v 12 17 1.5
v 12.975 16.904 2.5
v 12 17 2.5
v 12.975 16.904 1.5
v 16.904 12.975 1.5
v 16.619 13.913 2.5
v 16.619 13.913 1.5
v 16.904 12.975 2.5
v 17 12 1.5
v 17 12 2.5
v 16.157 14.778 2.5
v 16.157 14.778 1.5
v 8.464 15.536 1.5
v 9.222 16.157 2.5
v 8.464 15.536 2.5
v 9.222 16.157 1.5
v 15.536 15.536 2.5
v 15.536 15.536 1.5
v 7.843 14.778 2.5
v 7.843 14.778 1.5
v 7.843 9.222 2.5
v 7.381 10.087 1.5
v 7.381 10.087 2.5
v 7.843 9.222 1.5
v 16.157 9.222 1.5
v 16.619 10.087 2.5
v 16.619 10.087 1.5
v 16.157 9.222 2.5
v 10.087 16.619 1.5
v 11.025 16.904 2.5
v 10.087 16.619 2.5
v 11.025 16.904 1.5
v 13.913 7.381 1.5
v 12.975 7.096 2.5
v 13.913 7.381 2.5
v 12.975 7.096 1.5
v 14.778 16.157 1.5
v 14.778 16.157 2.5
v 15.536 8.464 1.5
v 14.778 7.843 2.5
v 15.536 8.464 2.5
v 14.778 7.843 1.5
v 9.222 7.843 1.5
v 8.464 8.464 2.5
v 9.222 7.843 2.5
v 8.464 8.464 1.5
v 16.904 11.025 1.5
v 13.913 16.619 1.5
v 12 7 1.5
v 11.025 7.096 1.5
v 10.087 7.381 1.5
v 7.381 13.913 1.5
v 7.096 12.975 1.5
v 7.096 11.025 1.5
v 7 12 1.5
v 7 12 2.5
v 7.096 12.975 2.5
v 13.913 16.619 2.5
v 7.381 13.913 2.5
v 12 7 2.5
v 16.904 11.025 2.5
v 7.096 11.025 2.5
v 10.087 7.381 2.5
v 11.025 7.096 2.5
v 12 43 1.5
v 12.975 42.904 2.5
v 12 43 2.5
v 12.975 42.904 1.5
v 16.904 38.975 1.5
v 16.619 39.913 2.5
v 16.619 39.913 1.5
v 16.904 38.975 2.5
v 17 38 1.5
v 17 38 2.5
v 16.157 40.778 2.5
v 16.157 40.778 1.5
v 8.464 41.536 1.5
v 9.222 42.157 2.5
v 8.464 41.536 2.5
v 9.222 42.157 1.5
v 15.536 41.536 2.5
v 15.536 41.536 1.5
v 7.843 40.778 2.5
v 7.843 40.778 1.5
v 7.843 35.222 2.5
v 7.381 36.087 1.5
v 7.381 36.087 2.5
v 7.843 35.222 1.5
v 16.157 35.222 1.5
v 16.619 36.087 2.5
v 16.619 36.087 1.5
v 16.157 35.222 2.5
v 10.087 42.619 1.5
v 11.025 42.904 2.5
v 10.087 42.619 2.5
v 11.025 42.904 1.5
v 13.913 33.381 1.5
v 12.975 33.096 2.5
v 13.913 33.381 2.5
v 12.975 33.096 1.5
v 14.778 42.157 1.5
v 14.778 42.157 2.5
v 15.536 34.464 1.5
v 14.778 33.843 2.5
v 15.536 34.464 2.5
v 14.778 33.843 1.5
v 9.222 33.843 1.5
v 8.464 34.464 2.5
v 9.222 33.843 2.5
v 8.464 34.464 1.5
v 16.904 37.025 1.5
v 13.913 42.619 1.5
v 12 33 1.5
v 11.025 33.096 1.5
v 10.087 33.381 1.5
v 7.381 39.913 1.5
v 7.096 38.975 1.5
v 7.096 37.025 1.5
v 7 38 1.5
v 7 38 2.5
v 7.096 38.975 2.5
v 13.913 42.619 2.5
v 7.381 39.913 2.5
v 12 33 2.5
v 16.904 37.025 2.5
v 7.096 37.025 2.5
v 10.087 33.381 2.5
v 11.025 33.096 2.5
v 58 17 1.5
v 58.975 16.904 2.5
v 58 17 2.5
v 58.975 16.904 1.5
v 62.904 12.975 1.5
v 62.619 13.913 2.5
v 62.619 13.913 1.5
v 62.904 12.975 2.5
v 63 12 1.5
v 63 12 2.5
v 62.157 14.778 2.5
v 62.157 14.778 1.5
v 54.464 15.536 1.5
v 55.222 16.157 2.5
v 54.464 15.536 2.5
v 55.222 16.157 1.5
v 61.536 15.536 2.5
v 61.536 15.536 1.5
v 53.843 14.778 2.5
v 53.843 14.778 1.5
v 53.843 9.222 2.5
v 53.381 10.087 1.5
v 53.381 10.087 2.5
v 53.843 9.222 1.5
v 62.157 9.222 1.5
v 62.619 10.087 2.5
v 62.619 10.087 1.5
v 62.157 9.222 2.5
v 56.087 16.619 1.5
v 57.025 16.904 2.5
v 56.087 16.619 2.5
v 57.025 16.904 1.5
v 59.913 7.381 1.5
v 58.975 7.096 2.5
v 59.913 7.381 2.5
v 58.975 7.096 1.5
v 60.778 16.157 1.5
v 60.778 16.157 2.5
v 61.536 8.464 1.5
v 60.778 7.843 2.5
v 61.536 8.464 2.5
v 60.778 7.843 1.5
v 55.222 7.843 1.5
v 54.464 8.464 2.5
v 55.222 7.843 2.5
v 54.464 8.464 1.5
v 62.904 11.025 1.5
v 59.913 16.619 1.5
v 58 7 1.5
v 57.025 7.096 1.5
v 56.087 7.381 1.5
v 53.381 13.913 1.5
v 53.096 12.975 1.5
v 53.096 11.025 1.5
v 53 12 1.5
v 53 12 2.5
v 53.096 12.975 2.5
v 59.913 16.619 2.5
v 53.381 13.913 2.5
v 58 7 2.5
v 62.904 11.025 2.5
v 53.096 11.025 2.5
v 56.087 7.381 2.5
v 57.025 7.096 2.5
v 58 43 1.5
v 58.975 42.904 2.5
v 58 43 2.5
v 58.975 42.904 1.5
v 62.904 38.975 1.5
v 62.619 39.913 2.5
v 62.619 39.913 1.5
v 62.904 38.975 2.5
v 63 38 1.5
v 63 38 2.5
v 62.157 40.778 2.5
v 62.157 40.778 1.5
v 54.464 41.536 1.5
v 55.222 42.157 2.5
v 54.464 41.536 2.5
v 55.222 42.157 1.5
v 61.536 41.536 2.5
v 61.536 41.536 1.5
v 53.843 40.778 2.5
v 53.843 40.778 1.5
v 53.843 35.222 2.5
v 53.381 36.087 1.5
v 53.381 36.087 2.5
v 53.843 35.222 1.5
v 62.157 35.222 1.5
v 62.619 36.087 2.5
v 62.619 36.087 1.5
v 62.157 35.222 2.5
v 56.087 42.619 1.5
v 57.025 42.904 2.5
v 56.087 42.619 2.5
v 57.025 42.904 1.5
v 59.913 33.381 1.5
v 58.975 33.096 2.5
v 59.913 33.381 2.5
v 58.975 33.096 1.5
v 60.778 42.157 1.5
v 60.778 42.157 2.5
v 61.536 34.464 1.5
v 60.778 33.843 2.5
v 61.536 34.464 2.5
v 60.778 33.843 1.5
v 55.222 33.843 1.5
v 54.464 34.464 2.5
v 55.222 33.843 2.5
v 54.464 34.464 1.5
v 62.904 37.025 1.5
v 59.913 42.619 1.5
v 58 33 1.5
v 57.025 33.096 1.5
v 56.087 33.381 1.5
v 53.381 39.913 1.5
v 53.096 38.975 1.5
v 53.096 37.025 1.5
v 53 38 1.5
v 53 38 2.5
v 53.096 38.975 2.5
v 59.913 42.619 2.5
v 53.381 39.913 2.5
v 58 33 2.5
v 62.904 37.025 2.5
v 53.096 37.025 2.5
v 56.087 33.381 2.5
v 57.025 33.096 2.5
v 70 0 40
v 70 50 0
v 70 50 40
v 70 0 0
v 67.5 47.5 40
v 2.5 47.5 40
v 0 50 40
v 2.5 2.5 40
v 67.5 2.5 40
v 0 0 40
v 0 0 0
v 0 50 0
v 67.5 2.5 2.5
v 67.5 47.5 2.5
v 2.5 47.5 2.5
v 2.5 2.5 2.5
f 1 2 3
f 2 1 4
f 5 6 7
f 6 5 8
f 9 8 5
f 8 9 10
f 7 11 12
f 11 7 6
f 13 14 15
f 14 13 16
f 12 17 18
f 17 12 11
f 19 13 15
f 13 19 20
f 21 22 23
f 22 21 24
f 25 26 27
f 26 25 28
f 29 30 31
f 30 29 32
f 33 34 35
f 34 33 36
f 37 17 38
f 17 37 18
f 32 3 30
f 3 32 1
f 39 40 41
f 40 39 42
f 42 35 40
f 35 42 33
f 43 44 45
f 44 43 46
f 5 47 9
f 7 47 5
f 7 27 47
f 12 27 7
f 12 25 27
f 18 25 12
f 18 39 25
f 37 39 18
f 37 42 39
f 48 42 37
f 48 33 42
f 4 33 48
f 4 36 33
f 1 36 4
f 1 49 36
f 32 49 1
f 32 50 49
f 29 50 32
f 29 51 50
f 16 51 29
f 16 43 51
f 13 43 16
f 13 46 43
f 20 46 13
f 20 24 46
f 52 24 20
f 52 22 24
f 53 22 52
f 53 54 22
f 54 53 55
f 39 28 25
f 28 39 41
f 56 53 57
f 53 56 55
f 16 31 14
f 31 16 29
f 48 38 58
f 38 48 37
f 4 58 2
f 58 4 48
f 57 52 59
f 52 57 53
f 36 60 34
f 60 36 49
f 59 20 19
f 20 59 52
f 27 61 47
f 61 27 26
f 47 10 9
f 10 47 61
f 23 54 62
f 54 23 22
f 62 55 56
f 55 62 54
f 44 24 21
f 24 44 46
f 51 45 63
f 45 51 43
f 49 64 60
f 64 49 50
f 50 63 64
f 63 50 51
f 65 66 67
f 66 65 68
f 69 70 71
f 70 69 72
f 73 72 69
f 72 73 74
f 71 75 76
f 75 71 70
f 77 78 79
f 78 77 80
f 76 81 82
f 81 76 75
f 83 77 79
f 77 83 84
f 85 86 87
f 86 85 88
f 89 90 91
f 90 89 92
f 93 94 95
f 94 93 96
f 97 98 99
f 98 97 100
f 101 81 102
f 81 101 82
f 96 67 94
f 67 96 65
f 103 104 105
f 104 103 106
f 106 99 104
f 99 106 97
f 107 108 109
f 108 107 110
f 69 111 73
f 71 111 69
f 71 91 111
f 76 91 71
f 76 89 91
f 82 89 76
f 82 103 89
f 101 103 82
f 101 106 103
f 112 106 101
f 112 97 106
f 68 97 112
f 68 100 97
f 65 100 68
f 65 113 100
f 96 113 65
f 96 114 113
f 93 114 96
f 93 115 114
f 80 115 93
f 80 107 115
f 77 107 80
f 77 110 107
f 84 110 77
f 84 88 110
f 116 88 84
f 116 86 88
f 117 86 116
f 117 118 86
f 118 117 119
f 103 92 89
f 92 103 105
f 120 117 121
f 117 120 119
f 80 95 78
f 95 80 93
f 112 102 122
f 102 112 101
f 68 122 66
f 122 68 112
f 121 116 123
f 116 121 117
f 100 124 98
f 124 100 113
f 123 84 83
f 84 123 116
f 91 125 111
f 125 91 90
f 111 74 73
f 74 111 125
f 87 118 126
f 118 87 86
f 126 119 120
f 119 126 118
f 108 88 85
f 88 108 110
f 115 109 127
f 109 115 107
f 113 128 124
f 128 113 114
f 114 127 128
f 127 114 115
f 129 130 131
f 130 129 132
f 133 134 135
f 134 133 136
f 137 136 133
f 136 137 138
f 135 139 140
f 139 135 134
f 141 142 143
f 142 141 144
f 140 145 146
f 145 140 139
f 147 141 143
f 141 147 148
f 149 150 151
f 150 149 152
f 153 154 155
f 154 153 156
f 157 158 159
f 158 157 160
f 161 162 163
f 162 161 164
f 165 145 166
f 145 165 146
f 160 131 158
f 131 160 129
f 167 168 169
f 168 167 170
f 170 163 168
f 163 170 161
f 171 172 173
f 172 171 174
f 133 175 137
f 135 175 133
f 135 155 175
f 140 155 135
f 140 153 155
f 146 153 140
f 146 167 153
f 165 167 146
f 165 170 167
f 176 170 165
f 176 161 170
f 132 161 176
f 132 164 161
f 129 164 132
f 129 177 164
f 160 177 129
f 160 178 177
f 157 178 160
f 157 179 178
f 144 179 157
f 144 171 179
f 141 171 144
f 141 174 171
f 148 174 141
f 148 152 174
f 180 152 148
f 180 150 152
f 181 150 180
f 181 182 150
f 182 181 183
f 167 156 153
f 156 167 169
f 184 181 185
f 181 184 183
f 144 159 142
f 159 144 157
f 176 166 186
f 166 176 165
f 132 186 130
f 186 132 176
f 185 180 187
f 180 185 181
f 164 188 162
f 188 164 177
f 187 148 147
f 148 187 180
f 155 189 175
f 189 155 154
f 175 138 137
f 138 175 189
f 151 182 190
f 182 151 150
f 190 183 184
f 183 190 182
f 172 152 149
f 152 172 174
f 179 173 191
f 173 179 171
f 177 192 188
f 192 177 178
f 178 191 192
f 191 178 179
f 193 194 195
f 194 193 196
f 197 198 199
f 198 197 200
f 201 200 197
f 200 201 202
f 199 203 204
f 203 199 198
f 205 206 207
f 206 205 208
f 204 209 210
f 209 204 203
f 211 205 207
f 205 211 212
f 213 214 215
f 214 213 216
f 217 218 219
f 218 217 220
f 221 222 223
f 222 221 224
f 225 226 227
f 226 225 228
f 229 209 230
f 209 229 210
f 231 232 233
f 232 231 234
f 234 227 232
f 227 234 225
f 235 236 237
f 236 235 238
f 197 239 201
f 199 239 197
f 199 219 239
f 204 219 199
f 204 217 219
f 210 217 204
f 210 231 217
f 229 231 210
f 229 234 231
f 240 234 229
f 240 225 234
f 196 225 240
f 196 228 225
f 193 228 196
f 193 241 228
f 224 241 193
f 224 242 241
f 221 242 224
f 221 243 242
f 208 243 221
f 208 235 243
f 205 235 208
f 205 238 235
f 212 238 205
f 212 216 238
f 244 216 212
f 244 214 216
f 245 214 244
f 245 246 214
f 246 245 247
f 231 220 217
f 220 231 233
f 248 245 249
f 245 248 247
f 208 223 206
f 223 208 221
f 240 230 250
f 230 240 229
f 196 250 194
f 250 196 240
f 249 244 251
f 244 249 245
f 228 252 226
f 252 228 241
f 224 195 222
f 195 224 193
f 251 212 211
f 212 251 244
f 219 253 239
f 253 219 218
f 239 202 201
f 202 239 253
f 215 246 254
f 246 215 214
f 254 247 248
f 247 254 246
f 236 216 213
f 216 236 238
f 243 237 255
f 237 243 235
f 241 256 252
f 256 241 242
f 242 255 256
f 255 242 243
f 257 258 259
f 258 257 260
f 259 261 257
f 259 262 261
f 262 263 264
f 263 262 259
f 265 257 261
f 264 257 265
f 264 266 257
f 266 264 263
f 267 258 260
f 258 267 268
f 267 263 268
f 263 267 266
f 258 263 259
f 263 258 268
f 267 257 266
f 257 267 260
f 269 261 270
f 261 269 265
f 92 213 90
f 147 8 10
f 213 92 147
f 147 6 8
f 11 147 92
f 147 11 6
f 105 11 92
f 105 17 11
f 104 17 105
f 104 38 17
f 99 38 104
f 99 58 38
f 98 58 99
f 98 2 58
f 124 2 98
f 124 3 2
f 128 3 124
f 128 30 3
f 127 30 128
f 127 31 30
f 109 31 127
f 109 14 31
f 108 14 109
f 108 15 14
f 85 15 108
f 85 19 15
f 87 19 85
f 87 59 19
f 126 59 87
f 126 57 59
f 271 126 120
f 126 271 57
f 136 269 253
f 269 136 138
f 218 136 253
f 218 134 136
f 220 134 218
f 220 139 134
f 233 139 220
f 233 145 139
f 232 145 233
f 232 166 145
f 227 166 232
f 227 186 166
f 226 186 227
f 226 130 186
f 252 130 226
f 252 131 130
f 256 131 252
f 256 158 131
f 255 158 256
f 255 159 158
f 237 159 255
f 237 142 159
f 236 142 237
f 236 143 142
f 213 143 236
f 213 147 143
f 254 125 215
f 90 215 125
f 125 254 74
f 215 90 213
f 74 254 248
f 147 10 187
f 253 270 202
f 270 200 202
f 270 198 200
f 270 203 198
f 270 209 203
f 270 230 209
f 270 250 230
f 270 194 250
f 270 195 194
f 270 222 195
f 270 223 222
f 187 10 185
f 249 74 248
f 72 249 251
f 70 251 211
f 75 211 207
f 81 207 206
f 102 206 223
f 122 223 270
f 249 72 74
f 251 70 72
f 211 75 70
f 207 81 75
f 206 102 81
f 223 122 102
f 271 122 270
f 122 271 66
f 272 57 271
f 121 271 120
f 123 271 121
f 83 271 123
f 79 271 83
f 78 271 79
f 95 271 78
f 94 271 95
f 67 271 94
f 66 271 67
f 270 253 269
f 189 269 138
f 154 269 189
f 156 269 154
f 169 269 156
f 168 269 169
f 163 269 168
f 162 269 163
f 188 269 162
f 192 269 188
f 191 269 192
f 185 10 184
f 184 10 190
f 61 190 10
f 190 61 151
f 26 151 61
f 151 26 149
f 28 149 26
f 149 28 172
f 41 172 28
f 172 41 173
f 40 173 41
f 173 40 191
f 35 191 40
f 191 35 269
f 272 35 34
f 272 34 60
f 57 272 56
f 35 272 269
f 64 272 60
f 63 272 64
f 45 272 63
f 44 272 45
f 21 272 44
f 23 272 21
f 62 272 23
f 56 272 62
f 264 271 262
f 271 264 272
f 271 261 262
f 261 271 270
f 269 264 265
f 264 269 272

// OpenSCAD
$fn = 32;

// ----------------------------------------------------------------------
// Enclosure box: bosses enclosure
// ----------------------------------------------------------------------

// --- parameters (mm) ---
box_l = 70;               // outer length, X
box_w = 50;               // outer width, Y
box_h = 40;               // outer height
wall_t = 2.5;             // wall thickness
boss_r = 5;               // corner boss radius
hole_r = 2;               // boss screw hole radius
boss_in = 12;             // boss inset from the corners

inner_h = box_h - wall_t;  // cavity depth
boss_h = inner_h - 2;  // corner boss height

difference() {
  cube([box_l, box_w, box_h]);
  translate([wall_t, wall_t, wall_t])
    cube([box_l - 2 * wall_t, box_w - 2 * wall_t, box_h]);
  for (sx = [0, 1], sy = [0, 1])
    translate([sx ? box_l - boss_in : boss_in,
               sy ? box_w - boss_in : boss_in, wall_t - 1]) {
      cylinder(r = boss_r, h = boss_h);
      translate([0, 0, boss_h - 4])
        cylinder(r = hole_r, h = 5);
    }
}
